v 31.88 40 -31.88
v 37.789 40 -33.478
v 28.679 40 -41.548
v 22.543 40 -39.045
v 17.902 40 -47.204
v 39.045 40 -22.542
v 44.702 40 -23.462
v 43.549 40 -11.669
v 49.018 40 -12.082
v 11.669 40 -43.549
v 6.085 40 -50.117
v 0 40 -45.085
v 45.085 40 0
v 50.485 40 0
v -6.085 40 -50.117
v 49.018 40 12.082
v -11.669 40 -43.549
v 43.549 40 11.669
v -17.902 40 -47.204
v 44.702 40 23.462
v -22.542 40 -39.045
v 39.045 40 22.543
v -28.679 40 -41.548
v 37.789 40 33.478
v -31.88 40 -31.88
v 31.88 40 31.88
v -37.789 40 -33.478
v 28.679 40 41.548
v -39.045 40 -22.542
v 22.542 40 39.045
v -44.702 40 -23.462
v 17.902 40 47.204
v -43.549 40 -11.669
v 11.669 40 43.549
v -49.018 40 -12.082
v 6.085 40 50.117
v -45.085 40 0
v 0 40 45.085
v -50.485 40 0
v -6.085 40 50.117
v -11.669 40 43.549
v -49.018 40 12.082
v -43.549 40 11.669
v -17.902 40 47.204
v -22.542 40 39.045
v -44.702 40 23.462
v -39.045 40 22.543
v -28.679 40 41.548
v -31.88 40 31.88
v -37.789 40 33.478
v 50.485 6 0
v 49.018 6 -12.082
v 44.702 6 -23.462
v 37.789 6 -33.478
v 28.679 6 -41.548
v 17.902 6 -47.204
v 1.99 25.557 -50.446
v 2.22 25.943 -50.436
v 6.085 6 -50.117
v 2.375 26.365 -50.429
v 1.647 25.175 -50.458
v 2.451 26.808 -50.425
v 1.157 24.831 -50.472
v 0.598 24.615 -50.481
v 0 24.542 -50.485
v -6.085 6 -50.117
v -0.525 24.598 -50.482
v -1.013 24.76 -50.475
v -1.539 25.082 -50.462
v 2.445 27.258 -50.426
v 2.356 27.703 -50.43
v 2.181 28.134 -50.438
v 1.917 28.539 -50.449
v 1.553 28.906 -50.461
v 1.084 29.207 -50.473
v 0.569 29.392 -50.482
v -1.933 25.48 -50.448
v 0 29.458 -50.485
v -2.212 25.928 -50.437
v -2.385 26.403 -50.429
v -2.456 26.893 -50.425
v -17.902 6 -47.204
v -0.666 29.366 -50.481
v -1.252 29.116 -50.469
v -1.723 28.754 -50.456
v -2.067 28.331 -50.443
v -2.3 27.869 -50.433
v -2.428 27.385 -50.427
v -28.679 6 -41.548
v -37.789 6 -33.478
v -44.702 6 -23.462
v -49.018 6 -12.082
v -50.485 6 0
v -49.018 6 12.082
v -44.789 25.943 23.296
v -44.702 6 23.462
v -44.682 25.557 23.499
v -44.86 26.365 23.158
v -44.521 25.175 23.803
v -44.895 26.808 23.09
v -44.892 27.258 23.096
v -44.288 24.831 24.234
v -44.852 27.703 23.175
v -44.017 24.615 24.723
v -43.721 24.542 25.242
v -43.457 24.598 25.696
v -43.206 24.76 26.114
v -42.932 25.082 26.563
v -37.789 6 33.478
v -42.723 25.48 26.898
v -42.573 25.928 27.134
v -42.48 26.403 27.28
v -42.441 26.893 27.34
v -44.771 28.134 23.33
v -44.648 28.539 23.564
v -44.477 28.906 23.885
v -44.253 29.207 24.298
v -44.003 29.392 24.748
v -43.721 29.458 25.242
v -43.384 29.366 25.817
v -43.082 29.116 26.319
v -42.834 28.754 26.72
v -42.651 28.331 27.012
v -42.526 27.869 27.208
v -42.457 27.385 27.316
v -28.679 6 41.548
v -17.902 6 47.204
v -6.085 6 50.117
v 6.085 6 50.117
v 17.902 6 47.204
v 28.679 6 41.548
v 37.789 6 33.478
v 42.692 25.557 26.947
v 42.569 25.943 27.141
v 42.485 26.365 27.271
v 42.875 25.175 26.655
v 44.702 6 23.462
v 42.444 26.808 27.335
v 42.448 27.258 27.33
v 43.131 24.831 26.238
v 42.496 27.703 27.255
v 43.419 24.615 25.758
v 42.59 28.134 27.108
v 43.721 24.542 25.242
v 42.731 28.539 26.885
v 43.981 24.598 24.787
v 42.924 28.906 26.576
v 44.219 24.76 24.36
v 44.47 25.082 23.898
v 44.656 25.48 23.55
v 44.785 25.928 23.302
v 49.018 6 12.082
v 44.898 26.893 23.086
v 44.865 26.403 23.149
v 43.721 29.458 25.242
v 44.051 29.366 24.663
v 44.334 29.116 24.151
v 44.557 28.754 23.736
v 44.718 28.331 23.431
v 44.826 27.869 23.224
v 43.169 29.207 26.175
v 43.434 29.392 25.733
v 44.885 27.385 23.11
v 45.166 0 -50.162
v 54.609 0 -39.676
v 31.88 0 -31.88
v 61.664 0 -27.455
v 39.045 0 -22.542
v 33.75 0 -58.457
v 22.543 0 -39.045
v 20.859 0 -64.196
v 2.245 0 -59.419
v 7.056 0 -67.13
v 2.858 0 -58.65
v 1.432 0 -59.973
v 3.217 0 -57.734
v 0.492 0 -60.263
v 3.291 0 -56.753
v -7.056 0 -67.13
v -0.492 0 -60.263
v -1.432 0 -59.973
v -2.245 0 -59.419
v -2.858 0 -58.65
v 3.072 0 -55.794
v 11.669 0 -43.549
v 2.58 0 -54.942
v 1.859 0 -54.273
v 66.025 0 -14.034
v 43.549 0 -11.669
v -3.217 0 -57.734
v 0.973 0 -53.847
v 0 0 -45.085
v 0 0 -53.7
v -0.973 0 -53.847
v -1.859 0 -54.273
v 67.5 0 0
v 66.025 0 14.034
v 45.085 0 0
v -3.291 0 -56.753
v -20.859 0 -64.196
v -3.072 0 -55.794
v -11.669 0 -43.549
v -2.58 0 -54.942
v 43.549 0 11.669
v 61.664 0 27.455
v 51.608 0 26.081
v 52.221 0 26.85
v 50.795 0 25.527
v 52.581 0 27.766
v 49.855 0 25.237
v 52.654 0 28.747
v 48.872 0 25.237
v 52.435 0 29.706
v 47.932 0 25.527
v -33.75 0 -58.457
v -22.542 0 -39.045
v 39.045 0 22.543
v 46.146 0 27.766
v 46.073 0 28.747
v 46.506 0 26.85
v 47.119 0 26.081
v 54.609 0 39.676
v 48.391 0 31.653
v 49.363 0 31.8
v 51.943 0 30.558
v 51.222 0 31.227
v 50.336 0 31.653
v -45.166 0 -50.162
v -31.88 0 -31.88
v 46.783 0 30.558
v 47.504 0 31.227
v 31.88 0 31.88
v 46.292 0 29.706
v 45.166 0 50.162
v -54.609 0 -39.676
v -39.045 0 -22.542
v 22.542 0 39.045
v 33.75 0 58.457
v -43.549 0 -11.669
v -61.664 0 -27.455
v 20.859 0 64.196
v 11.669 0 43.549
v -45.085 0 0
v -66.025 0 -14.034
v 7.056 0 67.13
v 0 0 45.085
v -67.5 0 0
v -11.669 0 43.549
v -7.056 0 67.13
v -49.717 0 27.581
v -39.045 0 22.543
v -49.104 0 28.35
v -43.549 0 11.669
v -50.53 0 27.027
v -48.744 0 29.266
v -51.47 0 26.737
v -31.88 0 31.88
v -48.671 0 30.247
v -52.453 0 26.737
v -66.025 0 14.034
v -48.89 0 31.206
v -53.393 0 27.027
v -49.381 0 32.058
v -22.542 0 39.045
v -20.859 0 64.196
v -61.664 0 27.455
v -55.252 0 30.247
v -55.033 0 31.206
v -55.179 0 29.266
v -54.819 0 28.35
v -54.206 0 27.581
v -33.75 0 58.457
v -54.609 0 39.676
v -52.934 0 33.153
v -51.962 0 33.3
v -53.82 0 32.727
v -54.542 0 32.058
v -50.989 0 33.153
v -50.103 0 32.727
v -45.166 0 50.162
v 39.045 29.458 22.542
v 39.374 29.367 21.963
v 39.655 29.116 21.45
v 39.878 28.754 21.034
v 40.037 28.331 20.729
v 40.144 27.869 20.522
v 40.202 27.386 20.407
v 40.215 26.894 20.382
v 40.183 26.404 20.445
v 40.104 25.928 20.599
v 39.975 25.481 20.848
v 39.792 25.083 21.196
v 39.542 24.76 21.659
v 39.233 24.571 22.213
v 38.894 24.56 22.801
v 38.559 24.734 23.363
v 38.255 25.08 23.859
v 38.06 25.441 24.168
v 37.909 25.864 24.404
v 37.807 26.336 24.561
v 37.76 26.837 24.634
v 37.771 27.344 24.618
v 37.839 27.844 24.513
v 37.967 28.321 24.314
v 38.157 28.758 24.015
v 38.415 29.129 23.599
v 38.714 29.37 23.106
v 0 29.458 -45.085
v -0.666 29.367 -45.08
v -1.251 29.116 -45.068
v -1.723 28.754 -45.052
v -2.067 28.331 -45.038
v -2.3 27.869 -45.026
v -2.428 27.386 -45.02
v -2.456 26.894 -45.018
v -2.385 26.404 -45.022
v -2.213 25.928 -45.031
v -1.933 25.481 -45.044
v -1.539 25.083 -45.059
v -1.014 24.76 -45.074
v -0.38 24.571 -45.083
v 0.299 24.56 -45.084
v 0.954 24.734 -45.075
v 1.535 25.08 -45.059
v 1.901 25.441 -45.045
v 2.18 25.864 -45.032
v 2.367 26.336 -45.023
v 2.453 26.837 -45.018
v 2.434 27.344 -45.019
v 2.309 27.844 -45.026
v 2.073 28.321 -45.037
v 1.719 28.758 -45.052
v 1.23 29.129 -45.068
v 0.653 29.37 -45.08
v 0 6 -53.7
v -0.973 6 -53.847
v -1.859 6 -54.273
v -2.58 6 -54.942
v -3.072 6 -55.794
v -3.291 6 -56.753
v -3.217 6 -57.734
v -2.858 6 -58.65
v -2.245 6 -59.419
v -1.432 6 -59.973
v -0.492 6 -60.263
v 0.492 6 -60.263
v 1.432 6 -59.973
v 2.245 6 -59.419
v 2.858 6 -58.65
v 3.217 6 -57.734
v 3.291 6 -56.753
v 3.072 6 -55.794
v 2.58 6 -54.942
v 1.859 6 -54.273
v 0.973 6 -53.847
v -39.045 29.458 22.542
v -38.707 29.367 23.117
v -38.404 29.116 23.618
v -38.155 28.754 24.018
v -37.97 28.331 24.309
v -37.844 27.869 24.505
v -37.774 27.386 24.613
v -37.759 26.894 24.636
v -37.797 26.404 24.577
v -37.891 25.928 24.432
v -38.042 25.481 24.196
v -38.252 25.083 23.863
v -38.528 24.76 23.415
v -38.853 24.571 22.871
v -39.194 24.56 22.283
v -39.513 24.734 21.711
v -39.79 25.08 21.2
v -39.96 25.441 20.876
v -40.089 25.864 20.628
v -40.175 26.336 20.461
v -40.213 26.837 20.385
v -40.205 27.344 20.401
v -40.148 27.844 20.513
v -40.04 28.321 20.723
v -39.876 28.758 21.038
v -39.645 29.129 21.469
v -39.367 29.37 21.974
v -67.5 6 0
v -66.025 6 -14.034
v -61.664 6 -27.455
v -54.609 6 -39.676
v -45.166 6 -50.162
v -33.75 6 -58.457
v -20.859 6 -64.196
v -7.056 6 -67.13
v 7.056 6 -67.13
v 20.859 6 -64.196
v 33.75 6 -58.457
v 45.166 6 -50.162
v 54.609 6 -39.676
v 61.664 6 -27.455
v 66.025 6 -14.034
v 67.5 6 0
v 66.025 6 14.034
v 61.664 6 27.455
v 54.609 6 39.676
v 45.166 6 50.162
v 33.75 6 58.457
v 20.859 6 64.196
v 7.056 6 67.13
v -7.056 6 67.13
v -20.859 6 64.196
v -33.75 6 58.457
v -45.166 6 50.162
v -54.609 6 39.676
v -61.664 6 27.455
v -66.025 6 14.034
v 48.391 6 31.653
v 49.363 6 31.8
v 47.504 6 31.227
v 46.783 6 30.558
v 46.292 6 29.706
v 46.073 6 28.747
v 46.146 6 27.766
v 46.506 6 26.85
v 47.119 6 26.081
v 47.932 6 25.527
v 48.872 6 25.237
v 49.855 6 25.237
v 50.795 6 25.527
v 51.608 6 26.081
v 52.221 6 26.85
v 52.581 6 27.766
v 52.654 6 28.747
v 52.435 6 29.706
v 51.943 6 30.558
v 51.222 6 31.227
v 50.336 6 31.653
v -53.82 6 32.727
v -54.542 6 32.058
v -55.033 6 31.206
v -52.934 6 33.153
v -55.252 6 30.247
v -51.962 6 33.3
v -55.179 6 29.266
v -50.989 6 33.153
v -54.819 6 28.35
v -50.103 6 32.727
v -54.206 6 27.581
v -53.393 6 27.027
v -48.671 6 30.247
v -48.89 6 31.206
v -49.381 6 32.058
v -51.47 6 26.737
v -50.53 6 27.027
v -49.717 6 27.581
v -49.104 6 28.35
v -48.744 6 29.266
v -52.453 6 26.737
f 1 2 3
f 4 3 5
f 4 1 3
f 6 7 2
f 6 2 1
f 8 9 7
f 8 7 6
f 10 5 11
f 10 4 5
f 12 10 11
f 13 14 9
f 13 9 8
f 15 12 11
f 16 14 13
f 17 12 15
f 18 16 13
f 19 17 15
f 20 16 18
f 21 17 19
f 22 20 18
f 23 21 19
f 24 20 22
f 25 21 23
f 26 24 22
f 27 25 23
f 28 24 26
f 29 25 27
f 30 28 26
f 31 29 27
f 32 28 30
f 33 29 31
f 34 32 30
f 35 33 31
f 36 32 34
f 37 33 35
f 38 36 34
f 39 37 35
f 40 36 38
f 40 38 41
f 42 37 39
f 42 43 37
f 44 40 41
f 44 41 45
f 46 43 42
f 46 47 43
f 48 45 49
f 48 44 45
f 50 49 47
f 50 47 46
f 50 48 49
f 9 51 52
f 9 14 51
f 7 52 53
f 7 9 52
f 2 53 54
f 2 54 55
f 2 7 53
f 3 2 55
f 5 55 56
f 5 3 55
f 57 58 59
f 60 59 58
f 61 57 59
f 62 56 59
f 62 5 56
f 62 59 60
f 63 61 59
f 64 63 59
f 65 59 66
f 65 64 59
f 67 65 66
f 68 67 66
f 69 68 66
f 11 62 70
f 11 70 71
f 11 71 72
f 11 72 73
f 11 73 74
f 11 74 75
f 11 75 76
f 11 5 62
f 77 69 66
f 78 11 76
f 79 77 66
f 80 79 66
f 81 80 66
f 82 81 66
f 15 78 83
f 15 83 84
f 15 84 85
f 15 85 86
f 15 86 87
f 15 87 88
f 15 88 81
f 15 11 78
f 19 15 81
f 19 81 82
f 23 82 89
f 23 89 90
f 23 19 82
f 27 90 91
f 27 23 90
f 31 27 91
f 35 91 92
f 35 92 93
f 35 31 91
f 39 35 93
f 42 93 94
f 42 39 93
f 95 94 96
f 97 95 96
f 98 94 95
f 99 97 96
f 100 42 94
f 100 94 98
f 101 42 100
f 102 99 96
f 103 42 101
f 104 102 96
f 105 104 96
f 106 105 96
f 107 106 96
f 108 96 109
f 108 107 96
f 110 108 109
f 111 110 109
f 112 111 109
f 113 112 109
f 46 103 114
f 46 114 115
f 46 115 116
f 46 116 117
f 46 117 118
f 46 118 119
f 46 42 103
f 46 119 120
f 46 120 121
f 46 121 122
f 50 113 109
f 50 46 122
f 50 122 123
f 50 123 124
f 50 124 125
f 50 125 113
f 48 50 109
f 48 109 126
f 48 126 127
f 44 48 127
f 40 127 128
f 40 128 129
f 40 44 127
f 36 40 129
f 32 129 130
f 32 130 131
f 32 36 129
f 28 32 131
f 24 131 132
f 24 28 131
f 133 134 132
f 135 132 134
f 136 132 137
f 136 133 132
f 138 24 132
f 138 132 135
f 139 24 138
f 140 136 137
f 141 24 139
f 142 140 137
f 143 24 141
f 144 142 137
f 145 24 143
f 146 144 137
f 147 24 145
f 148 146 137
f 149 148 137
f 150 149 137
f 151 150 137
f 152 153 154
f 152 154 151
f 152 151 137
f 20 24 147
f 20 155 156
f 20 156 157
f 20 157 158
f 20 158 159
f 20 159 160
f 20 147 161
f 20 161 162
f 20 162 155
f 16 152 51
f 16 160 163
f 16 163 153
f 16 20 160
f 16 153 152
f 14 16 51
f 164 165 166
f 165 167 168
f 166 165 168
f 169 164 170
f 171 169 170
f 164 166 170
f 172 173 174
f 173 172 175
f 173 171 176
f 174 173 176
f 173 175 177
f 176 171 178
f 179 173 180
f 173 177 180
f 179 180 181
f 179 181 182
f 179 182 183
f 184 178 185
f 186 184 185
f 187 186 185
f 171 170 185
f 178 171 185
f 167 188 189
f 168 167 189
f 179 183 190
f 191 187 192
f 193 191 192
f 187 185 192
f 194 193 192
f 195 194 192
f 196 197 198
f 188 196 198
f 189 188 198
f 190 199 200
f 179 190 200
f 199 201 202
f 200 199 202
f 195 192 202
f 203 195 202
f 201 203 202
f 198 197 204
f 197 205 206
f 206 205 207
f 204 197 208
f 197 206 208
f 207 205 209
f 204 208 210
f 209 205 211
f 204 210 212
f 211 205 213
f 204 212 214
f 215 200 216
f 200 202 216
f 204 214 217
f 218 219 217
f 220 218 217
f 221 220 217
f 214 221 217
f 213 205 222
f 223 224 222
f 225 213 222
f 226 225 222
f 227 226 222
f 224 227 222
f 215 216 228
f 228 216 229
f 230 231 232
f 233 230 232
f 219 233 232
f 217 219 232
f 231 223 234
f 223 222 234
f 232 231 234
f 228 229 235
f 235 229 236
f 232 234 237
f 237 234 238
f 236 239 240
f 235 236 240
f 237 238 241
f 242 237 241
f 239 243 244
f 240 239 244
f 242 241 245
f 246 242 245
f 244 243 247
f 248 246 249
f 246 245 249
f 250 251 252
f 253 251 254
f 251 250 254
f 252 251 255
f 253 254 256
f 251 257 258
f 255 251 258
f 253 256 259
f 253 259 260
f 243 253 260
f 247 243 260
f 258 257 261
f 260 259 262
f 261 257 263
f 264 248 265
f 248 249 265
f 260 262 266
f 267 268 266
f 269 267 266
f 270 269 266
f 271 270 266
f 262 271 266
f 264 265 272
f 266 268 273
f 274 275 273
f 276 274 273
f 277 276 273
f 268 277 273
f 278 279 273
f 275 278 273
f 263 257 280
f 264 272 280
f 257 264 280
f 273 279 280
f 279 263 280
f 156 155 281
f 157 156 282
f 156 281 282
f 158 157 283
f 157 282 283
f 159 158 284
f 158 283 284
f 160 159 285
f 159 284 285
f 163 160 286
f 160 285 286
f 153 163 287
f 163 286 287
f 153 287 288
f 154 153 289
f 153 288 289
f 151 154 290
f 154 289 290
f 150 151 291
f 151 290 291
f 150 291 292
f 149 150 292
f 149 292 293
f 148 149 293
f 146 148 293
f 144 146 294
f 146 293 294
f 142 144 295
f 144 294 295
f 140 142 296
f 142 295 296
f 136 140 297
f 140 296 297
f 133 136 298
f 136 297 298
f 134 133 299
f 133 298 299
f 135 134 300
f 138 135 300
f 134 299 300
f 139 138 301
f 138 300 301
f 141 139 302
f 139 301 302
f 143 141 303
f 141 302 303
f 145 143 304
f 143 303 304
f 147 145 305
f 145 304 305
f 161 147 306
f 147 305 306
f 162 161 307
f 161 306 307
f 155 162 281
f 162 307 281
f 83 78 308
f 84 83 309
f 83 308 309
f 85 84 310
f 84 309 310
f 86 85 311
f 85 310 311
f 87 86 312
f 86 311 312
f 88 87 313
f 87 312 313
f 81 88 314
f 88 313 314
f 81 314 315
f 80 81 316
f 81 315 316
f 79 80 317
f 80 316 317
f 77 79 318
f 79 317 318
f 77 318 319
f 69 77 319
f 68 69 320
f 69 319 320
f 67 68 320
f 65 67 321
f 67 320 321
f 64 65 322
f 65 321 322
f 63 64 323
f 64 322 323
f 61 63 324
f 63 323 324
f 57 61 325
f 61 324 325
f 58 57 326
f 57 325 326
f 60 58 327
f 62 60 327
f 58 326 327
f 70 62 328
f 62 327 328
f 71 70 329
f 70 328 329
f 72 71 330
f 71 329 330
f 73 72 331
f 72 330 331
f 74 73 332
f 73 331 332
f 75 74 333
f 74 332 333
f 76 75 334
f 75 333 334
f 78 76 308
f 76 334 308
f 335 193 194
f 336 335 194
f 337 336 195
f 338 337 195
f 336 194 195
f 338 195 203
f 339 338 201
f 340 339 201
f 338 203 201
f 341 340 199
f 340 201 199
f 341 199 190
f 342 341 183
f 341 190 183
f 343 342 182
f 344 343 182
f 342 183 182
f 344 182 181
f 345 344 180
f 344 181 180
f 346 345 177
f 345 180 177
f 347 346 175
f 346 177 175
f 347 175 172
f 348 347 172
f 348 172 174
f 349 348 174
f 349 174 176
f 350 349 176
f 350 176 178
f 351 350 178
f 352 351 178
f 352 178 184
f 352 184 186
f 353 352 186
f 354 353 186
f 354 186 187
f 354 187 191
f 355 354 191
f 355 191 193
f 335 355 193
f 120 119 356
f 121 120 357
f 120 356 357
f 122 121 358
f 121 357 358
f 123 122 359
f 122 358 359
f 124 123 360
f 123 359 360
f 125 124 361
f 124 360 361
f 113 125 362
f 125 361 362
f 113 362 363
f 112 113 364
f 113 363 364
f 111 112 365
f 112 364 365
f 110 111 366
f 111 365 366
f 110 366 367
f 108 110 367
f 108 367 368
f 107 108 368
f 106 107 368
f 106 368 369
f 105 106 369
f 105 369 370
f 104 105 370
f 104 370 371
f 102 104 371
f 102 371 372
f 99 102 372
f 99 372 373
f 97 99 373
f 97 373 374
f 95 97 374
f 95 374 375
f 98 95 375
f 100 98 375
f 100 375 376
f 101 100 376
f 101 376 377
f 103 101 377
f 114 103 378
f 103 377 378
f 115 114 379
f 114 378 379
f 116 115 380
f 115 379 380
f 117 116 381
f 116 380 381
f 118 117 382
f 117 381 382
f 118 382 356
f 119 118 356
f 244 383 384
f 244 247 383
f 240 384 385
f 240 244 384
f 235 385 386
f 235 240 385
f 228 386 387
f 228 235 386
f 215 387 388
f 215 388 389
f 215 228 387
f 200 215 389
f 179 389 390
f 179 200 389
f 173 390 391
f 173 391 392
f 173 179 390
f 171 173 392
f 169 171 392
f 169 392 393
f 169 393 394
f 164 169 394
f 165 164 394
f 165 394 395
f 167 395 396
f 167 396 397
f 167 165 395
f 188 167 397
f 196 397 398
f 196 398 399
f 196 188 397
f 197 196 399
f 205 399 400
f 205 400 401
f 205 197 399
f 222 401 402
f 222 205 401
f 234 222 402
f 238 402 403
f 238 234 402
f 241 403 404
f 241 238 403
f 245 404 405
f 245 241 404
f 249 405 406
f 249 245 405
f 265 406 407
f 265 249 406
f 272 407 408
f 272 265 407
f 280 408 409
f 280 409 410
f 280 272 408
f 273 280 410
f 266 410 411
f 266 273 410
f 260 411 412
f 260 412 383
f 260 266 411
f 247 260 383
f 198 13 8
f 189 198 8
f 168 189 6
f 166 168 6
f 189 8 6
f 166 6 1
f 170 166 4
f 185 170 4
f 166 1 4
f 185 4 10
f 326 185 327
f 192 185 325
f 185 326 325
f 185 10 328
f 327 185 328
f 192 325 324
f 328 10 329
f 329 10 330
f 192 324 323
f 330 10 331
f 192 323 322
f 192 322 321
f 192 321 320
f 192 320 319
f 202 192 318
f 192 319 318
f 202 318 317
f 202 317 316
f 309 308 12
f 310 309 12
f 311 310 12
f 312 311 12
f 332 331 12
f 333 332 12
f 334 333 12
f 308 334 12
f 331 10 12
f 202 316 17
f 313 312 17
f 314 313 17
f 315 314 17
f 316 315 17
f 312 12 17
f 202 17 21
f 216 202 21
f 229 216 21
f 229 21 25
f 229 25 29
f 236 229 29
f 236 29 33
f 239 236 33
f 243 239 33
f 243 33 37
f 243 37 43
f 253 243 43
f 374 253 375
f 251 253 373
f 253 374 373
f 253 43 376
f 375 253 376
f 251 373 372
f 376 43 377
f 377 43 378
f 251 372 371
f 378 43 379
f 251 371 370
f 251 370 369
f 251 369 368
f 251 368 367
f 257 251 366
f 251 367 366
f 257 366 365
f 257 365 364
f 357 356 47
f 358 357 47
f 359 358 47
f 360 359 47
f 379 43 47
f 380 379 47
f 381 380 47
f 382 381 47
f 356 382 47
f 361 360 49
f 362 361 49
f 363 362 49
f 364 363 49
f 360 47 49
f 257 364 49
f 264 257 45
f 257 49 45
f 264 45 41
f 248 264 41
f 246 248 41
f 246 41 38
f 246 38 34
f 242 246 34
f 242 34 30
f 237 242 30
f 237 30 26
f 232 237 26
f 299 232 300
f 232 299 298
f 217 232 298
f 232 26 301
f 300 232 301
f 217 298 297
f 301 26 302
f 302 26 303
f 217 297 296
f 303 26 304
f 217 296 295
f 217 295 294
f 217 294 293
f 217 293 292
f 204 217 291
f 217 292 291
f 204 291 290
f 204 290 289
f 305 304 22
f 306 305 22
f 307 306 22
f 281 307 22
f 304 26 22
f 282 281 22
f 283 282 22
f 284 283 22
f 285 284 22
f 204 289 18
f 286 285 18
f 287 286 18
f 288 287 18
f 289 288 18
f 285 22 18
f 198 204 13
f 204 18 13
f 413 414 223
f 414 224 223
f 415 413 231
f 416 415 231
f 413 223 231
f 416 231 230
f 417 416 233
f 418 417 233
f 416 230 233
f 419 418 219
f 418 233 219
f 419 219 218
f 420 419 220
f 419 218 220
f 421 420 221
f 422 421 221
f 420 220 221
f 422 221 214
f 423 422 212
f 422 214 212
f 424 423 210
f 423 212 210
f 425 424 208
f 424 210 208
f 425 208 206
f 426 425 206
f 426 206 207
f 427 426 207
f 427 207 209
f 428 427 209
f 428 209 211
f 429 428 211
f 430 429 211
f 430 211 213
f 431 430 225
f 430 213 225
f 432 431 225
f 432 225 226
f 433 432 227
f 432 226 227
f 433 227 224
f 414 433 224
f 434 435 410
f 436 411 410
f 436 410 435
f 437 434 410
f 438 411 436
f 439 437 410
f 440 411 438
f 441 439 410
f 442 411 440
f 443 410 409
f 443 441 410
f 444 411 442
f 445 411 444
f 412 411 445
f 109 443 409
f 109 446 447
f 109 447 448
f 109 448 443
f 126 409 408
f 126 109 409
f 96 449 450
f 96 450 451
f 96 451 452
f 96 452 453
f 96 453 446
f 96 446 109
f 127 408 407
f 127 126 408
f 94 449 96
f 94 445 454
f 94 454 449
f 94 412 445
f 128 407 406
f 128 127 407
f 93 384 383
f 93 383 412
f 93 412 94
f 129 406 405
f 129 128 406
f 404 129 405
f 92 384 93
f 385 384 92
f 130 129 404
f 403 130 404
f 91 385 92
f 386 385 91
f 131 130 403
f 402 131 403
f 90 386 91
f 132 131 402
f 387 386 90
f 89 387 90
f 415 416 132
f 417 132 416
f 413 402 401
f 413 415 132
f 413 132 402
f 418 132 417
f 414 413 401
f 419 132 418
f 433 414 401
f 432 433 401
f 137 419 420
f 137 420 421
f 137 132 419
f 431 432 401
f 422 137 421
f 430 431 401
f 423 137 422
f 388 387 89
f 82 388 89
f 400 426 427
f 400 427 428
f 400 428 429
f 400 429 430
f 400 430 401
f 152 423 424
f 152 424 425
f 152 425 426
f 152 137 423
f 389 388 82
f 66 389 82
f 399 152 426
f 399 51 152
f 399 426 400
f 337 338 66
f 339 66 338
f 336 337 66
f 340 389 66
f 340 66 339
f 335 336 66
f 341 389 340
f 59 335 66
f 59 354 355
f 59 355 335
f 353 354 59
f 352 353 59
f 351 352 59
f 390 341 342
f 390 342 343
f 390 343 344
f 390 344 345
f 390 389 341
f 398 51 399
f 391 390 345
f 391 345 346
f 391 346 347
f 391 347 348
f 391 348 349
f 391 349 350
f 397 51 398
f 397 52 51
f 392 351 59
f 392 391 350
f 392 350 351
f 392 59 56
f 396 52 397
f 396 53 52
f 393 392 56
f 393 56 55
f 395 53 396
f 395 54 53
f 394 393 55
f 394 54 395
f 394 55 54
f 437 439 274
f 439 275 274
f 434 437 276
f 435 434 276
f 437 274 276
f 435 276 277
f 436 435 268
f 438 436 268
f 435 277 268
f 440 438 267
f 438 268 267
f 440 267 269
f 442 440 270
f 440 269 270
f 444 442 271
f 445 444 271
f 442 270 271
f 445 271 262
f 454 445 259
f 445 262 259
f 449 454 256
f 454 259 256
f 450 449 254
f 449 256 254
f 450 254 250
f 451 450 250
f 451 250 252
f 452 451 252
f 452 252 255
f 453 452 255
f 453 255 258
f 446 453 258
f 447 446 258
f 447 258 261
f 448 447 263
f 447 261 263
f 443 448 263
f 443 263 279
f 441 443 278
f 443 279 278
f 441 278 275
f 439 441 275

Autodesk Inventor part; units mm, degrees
ref_plane "YZ Plane" through (0, 0, 0) normal (1, 0, 0) x (0, 1, 0)
ref_plane "XZ Plane" through (0, 0, 0) normal (0, 1, 0) x (-1, 0, 0)
sketch "Sketch1" plane through (0, 0, 0) normal (0, 1, 0) x (-1, 0, 0)
  circle A0 centre (0, 0) radius 67.5
  dimension "d0" = 135
extrude "body" add sketch "Sketch1" along normal blind 40
sketch "Sketch2" plane through (0, 40, 0) normal (0, 1, 0) x (1, 0, 0)
  circle A0 centre (0, 0) radius 67.5 projected
  circle A1 centre (0, 0) radius 45.085
  dimension "d4" = 90.17
extrude "hole" cut sketch "Sketch2" against normal blind 101.6 contours A1
sketch "Sketch3" plane through (0, 40, 0) normal (0, 1, 0) x (1, 0, 0)
  circle A0 centre (0, 0) radius 45.085 projected
  circle A1 centre (0, 0) radius 67.5 projected
  circle A2 centre (0, 0) radius 50.485
  dimension "d9" = 5.4
extrude "flange" cut sketch "Sketch3" against normal blind 34 contours A1
sketch "Sketch4" plane through (0, 40, 0) normal (0, 1, 0) x (1, 0, 0)
  circle A0 centre (0, 0) radius 50.485 projected
  circle A1 centre (0, 0) radius 45.085 projected
  point P0 (0, 50.485)
ref_plane "Work Plane1" through (0, 40, -50.485) normal (0, 0, -1) x (-1, 0, 0)
sketch "Sketch5" plane through (0, 40, -50.485) normal (0, 0, -1) x (-1, 0, 0)
  circle A0 centre (0, -13) radius 2.54
  line L0 (50.485, 0) -> (-50.485, 0) projected
  point P0 (0, -40)
  dimension "d12" = 13
  dimension "d13" = 5.08
hole "sideHoleSE" at (0, 27, -50.485) direction (0, 0, 1) diameter 4.917 depth 17.1 tip angle 118 thread size "M6x1" class "6H" standard "ANSI Metric M Profile"
pattern_circular "sideHoleSW" count 2 over 120 about axis through (0, 40, 0) along (0, -1, 0) of "sideHoleSE"
pattern_circular "sideHoleN" count 2 over 120 about axis through (0, 40, 0) along (0, 1, 0) of "sideHoleSE"
sketch "Sketch8" plane through (0, 6, 0) normal (0, 1, 0) x (1, 0, 0)
  circle A0 centre (0, 0) radius 50.485 projected
  circle A1 centre (0, 0) radius 67.5 projected
  circle A2 centre (0, 57) radius 3.1903
  line L0 (0, 0) -> (49.3634, -28.5) construction
  line L1 (0, 0) -> (57, 0) construction
  circle A3 centre (49.3634, -28.5) radius 3.101
  line L2 (0, 0) -> (-51.9615, -30) construction
  line L3 (0, 0) -> (60, 0) construction
  circle A4 centre (-51.9615, -30) radius 3.5807
  dimension "d65" = 57
  dimension "d66" = 57
  dimension "d67" = 30
  dimension "d68" = 60
  dimension "d69" = 150
hole "Hole5" at (0, 6, -57) at (49.3634, 6, 28.5) at (-51.9615, 6, 30) direction (0, -1, 0) diameter 6.6 end through all clearance for "Flat Head Machine Screw" size "M6" standard "Ansi Metric M Profile"
properties part number "2f1col" material "Aluminum 6061"
